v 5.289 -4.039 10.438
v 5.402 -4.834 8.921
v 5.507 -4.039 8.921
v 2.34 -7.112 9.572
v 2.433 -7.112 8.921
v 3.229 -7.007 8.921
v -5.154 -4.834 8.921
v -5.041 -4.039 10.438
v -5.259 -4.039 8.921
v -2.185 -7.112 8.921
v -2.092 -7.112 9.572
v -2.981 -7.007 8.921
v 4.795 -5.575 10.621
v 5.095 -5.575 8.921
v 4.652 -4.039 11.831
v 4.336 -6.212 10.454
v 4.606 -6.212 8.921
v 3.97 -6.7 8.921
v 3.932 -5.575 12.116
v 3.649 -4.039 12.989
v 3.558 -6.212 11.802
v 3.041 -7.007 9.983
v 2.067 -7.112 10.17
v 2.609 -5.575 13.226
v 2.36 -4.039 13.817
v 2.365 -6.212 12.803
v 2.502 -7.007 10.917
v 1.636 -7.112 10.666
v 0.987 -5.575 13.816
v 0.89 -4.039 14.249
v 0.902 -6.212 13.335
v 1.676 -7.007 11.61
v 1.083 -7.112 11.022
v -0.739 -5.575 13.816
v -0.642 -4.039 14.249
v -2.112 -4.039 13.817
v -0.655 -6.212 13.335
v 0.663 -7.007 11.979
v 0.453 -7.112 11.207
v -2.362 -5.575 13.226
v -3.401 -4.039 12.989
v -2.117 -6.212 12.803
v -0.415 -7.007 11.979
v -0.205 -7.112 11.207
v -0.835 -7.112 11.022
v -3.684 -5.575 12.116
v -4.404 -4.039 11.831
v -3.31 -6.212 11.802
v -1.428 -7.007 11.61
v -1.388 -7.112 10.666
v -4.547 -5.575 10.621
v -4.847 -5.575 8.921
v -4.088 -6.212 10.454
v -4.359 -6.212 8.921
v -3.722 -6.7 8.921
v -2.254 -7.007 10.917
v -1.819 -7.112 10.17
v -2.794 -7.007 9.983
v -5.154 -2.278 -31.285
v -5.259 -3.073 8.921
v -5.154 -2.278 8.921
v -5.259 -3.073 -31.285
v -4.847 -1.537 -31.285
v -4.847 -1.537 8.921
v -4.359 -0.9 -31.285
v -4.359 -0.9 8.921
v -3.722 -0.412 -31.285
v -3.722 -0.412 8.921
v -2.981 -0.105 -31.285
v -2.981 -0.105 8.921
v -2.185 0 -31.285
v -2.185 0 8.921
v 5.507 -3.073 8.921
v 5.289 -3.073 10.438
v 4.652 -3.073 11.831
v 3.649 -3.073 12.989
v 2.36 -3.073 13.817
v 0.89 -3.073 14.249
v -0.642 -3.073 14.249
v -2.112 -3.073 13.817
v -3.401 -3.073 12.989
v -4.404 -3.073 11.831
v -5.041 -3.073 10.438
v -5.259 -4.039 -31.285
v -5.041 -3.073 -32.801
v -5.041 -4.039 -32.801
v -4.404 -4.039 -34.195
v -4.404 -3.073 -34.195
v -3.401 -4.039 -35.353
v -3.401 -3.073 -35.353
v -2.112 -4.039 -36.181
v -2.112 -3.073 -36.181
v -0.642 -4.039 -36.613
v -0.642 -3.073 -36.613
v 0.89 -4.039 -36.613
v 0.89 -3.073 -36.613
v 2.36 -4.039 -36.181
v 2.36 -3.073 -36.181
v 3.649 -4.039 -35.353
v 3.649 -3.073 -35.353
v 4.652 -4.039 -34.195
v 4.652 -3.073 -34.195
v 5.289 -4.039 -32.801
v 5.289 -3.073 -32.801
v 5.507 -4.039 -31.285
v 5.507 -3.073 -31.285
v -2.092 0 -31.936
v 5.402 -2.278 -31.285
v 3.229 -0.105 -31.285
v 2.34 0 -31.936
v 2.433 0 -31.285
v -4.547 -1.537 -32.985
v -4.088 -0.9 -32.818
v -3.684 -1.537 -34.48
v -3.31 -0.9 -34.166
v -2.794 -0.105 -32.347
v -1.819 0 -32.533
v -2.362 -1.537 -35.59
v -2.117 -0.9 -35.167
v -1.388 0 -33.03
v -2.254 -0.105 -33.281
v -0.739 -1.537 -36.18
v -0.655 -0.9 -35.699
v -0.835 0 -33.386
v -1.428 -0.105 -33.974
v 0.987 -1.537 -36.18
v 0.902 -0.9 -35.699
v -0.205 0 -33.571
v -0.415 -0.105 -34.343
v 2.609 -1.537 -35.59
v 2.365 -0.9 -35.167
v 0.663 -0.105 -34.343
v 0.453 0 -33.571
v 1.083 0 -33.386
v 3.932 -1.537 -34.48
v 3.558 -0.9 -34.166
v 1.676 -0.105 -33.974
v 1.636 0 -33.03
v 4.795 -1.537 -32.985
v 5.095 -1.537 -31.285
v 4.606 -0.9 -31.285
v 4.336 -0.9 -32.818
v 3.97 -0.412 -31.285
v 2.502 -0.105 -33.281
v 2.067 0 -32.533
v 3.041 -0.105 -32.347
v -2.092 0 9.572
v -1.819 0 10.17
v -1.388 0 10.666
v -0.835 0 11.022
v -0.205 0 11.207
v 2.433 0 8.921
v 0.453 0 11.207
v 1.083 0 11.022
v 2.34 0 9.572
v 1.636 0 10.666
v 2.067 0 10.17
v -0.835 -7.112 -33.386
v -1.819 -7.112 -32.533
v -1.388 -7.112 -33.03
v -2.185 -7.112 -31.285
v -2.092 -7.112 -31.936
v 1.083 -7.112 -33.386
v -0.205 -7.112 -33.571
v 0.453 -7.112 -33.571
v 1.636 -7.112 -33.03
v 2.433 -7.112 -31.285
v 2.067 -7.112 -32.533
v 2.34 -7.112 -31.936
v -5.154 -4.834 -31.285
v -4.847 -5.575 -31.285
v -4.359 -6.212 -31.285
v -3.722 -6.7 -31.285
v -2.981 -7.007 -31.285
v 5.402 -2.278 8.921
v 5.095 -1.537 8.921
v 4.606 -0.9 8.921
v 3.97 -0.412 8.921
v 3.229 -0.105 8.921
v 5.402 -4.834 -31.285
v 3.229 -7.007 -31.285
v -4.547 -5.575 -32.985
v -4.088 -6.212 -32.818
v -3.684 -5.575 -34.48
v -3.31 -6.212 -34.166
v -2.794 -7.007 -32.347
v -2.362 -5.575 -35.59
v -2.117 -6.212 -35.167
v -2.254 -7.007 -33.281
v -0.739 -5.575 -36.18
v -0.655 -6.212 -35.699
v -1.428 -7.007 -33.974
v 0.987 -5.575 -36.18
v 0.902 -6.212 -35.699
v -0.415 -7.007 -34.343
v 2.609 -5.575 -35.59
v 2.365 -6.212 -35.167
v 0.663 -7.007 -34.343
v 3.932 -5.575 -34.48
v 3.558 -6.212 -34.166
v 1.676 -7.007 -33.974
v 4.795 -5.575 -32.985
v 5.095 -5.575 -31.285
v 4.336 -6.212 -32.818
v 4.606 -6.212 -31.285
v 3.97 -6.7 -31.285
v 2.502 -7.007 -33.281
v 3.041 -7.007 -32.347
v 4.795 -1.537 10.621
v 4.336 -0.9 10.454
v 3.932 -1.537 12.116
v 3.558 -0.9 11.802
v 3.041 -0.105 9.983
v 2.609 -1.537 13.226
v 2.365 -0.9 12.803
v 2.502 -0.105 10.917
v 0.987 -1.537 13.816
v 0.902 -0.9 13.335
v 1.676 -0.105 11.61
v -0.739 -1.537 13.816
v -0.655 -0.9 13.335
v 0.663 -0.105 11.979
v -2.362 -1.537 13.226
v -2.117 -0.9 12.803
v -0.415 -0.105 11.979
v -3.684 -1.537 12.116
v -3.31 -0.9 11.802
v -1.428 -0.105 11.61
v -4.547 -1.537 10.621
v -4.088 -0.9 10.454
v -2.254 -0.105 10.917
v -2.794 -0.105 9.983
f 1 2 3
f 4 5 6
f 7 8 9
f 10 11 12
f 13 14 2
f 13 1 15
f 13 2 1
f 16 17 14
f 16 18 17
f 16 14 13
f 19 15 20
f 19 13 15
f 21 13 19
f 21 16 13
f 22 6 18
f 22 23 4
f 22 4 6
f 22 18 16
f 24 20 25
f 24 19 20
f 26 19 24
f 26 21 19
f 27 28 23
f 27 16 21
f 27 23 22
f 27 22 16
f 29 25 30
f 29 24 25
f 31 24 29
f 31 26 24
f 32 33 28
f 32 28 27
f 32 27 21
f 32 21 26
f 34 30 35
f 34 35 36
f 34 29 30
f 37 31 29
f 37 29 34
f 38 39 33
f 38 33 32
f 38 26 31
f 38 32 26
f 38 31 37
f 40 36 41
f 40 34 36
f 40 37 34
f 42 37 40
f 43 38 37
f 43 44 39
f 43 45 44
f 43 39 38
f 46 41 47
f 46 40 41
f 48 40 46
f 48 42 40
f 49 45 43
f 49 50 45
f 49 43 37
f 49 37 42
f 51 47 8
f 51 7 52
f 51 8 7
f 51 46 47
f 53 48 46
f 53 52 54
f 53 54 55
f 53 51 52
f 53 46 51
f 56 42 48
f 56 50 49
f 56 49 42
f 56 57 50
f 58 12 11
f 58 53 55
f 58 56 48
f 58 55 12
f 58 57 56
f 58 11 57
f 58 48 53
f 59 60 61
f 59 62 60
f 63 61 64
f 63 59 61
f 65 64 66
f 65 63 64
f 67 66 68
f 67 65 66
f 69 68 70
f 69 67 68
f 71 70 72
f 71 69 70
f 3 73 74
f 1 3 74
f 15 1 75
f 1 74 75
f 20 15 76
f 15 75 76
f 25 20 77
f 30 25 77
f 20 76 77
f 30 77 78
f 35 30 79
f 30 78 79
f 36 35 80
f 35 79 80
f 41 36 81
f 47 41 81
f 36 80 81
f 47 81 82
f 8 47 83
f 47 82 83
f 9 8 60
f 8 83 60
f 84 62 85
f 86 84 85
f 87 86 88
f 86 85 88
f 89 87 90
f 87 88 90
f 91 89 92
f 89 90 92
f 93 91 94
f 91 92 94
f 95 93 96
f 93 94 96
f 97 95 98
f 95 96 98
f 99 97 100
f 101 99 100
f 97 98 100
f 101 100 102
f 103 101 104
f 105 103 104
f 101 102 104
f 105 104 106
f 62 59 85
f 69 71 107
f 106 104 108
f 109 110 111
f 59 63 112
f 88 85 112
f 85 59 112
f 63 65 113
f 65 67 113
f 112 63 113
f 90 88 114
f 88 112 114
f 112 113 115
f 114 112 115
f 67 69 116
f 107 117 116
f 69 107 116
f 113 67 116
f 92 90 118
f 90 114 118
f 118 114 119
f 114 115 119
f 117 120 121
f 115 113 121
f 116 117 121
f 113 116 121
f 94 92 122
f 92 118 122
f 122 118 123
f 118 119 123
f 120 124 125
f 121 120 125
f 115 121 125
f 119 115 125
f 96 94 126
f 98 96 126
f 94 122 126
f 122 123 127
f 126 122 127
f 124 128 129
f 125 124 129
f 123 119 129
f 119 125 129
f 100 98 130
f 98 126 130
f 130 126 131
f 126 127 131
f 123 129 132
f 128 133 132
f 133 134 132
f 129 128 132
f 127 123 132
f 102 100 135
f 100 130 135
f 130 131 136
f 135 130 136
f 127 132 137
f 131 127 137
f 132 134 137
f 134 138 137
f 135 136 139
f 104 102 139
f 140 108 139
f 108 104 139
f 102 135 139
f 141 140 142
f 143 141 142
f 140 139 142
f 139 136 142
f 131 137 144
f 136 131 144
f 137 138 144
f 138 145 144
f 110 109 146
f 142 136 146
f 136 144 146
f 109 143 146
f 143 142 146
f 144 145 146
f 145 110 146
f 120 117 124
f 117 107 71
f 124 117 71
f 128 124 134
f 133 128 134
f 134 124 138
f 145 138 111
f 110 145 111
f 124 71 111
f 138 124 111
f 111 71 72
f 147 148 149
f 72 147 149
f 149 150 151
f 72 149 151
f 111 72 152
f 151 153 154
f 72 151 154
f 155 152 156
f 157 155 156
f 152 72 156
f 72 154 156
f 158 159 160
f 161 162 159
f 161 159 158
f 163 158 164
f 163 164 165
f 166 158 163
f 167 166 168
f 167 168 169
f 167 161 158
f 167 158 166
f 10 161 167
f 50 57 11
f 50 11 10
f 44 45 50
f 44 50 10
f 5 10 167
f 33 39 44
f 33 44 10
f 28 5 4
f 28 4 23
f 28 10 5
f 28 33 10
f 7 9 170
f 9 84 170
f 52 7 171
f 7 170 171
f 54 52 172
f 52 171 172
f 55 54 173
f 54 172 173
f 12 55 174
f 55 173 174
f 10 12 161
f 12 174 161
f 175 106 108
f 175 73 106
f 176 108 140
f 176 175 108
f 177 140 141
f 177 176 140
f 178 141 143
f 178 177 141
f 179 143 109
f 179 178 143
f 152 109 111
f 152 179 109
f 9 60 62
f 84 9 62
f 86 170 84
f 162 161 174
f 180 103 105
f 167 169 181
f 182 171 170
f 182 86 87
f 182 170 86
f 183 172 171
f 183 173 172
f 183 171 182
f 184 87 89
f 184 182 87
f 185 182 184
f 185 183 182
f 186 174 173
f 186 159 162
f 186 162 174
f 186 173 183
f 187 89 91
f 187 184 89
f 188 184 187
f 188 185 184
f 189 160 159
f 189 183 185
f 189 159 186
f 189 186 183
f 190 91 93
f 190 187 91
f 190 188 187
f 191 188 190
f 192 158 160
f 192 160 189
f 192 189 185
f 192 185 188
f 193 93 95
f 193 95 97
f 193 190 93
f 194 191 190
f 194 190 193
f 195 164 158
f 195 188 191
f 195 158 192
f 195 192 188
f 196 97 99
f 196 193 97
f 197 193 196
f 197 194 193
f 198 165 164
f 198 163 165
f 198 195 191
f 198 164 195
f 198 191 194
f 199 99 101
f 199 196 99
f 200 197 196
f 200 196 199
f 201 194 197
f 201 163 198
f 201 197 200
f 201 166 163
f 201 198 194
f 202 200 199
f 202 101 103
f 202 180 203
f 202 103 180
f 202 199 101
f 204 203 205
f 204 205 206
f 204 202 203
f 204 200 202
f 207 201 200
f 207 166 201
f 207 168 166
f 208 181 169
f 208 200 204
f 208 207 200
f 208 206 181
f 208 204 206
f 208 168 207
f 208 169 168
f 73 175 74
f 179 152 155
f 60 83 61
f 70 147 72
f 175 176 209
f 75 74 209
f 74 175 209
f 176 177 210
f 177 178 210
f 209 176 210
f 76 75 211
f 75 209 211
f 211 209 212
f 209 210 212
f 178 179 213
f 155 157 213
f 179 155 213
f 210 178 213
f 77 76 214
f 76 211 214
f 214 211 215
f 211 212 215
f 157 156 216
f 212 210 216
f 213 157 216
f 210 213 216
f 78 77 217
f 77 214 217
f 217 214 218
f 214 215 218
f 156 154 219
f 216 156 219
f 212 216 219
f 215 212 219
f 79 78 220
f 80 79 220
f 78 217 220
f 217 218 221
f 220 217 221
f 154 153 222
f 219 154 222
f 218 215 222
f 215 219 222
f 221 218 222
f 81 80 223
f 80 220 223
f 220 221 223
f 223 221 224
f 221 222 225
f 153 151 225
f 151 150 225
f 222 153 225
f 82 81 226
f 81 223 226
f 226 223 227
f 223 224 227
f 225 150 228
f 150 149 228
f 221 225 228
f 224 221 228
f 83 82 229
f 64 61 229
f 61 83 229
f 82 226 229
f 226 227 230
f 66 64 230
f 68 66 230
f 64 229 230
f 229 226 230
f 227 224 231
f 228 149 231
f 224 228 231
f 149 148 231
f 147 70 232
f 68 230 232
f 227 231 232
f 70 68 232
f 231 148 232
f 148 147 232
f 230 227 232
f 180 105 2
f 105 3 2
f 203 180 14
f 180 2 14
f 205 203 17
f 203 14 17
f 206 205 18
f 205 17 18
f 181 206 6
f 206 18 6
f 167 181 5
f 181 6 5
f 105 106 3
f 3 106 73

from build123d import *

# Parameters (mm, degrees)
F1_DEPTH = 7.112
F2_R     = 3.0734


with BuildPart() as f1:
    # F0 (on Front) → F1 (new body)
    with BuildSketch(Plane.XZ):
        with BuildLine():
            ThreePointArc((-5.258809, -5.404494), (0.123873, -0.021812), (5.506555, -5.404494))
            Line((5.506555, -5.404494), (5.506555, 1.758267))
            Line((5.506555, 1.758267), (5.506555, 5.966515))
            Line((5.506555, 5.966515), (5.506555, 8.921028))
            ThreePointArc((5.506555, 8.921028), (0.123873, 14.30371), (-5.258809, 8.921028))
            Line((-5.258809, 8.921028), (-5.258809, 2.41463))
            Line((-5.258809, 2.41463), (-5.258809, -5.404494))
        make_face()
        with BuildLine():
            Line((-5.258809, -5.404494), (5.506555, -5.404494))
            ThreePointArc((5.506555, -5.404494), (0.123873, -0.021812), (-5.258809, -5.404494))
        make_face()
        with BuildLine():
            ThreePointArc((-5.258809, -5.404494), (0.123873, -10.787176), (5.506555, -5.404494))
            Line((5.506555, -5.404494), (-5.258809, -5.404494))
        make_face()
        with BuildLine():
            ThreePointArc((-5.258809, -31.284998), (0.123873, -36.66768), (5.506555, -31.284998))
            Line((5.506555, -31.284998), (5.506555, -5.404494))
            ThreePointArc((5.506555, -5.404494), (0.123873, -10.787176), (-5.258809, -5.404494))
            Line((-5.258809, -5.404494), (-5.258809, -12.387301))
            Line((-5.258809, -12.387301), (-5.258809, -31.284998))
        make_face()
    extrude(amount=F1_DEPTH)

    # F2
    f2_edges = [f1.edges().sort_by_distance(p)[0] for p in [
        (5.506555, -7.112, -11.181985),
        (5.506555, 0, -11.181985),
        (-5.258809, 0, -11.181985),
        (-5.258809, -7.112, -11.181985),
        (0.123873, 0, 14.30371),
        (0.123873, -7.112, 14.30371),
        (0.123873, 0, -36.66768),
        (0.123873, -7.112, -36.66768),
    ]]
    fillet(f2_edges, radius=F2_R)


solid = f1.part
